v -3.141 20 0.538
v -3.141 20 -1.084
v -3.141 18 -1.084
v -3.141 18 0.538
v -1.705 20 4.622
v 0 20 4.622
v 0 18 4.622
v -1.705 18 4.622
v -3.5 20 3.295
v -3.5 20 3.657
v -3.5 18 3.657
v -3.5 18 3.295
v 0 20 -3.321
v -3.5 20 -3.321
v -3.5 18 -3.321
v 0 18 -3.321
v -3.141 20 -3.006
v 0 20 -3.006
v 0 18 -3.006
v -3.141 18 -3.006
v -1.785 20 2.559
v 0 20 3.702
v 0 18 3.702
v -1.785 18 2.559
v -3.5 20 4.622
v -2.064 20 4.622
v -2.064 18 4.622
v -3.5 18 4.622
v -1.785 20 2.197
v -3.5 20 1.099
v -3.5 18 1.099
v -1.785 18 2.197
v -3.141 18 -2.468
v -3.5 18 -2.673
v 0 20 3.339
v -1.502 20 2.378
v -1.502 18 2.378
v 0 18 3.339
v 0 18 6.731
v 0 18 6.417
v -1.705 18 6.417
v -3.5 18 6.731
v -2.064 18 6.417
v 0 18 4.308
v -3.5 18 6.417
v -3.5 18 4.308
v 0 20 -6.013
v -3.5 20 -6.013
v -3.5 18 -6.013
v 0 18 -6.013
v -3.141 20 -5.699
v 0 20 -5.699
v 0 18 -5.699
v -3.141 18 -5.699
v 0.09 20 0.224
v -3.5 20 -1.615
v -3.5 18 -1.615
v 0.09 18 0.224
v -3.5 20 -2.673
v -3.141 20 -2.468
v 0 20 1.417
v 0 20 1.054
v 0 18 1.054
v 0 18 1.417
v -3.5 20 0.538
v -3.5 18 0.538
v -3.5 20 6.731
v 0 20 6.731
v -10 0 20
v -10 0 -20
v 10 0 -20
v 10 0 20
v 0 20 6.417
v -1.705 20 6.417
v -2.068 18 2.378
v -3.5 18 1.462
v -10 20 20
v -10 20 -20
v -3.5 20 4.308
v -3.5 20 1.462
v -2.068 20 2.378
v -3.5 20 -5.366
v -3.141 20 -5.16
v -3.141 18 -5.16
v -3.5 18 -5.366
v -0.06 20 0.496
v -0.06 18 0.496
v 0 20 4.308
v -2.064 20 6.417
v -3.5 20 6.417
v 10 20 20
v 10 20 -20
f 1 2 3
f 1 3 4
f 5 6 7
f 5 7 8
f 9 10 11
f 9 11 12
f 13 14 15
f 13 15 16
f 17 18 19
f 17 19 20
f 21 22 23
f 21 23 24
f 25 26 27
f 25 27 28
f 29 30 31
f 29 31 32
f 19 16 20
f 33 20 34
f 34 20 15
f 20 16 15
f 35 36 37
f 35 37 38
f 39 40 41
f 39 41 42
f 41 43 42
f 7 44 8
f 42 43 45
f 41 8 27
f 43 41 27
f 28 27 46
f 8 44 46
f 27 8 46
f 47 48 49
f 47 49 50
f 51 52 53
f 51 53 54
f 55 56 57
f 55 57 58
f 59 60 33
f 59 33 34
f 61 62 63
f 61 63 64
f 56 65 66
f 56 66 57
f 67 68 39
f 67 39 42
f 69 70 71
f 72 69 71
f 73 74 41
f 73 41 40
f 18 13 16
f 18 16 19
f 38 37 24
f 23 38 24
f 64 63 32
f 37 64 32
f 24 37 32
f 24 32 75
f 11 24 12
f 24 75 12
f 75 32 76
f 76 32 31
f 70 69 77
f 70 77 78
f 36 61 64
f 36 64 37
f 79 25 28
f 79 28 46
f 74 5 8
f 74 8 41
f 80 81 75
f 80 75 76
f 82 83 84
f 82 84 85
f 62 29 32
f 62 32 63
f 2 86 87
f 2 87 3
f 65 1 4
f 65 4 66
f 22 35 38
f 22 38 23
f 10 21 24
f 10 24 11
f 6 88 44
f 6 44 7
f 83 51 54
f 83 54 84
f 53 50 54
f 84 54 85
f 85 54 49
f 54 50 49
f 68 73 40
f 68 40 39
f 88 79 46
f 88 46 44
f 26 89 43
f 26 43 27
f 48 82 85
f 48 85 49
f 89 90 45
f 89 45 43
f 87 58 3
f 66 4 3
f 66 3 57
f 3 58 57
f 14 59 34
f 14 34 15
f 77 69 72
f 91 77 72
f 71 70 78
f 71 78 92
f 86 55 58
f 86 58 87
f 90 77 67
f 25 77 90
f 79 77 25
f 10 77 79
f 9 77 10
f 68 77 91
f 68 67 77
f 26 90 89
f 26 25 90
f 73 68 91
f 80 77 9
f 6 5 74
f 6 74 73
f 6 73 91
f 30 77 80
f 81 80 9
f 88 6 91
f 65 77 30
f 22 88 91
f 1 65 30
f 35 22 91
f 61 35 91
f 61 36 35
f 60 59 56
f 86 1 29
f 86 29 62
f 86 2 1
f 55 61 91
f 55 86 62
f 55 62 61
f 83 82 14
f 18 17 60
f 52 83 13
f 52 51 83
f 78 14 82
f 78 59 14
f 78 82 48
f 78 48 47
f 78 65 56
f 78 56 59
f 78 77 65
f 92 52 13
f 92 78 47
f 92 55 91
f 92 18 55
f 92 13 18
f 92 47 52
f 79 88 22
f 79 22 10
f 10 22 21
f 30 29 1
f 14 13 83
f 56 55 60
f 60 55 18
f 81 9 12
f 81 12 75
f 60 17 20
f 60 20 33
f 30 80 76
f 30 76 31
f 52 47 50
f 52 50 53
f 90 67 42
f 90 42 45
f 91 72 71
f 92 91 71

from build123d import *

# Parameters (mm, degrees)
SKETCH1_W           = 20
SKETCH1_H           = 40
BOSS_EXTRUDE1_DEPTH = 20
CUT_EXTRUDE1_DEPTH  = 2


with BuildPart() as part:
    # Sketch1 → Boss-Extrude1 (new body)
    with BuildSketch(Plane(origin=(0, 0, 0), x_dir=(1, 0, 0), z_dir=(0, 1, 0))):
        Rectangle(SKETCH1_W, SKETCH1_H)
    extrude(amount=BOSS_EXTRUDE1_DEPTH)

    # Sketch2 → Cut-Extrude1 (cut)
    with BuildSketch(Plane(origin=(0, 20, 0), x_dir=(1, 0, 0), z_dir=(0, 1, 0))):
        Polygon((-3.5, -6.730769231), (-3.5, -6.416666667), (-2.064102564, -6.416666667), (-2.064102564, -4.621794872), (-3.5, -4.621794872), (-3.5, -4.307692308), (0, -4.307692308), (0, -4.621794872), (-1.705128205, -4.621794872), (-1.705128205, -6.416666667), (0, -6.416666667), (0, -6.730769231), align=None)
        Polygon((-3.5, -3.657051282), (-3.5, -3.294571314), (-2.068309295, -2.378205128), (-3.5, -1.461838942), (-3.5, -1.099358974), (-1.78505609, -2.196614583), (0, -1.054487179), (0, -1.416967147), (-1.501802885, -2.378205128), (0, -3.339443109), (0, -3.701923077), (-1.78505609, -2.559094551), align=None)
        Polygon((-3.5, -0.538461538), (-3.5, 1.615384615), (0.08974359, -0.224358974), (-0.059595353, -0.495693109), (-3.141025641, 1.083934295), (-3.141025641, -0.538461538), align=None)
        Polygon((-3.5, 2.673377404), (-3.5, 3.320512821), (0, 3.320512821), (0, 3.006410256), (-3.141025641, 3.006410256), (-3.141025641, 2.467948718), align=None)
        Polygon((-3.5, 5.365685096), (-3.5, 6.012820513), (0, 6.012820513), (0, 5.698717949), (-3.141025641, 5.698717949), (-3.141025641, 5.16025641), align=None)
    extrude(amount=-CUT_EXTRUDE1_DEPTH, mode=Mode.SUBTRACT)


solid = part.part
